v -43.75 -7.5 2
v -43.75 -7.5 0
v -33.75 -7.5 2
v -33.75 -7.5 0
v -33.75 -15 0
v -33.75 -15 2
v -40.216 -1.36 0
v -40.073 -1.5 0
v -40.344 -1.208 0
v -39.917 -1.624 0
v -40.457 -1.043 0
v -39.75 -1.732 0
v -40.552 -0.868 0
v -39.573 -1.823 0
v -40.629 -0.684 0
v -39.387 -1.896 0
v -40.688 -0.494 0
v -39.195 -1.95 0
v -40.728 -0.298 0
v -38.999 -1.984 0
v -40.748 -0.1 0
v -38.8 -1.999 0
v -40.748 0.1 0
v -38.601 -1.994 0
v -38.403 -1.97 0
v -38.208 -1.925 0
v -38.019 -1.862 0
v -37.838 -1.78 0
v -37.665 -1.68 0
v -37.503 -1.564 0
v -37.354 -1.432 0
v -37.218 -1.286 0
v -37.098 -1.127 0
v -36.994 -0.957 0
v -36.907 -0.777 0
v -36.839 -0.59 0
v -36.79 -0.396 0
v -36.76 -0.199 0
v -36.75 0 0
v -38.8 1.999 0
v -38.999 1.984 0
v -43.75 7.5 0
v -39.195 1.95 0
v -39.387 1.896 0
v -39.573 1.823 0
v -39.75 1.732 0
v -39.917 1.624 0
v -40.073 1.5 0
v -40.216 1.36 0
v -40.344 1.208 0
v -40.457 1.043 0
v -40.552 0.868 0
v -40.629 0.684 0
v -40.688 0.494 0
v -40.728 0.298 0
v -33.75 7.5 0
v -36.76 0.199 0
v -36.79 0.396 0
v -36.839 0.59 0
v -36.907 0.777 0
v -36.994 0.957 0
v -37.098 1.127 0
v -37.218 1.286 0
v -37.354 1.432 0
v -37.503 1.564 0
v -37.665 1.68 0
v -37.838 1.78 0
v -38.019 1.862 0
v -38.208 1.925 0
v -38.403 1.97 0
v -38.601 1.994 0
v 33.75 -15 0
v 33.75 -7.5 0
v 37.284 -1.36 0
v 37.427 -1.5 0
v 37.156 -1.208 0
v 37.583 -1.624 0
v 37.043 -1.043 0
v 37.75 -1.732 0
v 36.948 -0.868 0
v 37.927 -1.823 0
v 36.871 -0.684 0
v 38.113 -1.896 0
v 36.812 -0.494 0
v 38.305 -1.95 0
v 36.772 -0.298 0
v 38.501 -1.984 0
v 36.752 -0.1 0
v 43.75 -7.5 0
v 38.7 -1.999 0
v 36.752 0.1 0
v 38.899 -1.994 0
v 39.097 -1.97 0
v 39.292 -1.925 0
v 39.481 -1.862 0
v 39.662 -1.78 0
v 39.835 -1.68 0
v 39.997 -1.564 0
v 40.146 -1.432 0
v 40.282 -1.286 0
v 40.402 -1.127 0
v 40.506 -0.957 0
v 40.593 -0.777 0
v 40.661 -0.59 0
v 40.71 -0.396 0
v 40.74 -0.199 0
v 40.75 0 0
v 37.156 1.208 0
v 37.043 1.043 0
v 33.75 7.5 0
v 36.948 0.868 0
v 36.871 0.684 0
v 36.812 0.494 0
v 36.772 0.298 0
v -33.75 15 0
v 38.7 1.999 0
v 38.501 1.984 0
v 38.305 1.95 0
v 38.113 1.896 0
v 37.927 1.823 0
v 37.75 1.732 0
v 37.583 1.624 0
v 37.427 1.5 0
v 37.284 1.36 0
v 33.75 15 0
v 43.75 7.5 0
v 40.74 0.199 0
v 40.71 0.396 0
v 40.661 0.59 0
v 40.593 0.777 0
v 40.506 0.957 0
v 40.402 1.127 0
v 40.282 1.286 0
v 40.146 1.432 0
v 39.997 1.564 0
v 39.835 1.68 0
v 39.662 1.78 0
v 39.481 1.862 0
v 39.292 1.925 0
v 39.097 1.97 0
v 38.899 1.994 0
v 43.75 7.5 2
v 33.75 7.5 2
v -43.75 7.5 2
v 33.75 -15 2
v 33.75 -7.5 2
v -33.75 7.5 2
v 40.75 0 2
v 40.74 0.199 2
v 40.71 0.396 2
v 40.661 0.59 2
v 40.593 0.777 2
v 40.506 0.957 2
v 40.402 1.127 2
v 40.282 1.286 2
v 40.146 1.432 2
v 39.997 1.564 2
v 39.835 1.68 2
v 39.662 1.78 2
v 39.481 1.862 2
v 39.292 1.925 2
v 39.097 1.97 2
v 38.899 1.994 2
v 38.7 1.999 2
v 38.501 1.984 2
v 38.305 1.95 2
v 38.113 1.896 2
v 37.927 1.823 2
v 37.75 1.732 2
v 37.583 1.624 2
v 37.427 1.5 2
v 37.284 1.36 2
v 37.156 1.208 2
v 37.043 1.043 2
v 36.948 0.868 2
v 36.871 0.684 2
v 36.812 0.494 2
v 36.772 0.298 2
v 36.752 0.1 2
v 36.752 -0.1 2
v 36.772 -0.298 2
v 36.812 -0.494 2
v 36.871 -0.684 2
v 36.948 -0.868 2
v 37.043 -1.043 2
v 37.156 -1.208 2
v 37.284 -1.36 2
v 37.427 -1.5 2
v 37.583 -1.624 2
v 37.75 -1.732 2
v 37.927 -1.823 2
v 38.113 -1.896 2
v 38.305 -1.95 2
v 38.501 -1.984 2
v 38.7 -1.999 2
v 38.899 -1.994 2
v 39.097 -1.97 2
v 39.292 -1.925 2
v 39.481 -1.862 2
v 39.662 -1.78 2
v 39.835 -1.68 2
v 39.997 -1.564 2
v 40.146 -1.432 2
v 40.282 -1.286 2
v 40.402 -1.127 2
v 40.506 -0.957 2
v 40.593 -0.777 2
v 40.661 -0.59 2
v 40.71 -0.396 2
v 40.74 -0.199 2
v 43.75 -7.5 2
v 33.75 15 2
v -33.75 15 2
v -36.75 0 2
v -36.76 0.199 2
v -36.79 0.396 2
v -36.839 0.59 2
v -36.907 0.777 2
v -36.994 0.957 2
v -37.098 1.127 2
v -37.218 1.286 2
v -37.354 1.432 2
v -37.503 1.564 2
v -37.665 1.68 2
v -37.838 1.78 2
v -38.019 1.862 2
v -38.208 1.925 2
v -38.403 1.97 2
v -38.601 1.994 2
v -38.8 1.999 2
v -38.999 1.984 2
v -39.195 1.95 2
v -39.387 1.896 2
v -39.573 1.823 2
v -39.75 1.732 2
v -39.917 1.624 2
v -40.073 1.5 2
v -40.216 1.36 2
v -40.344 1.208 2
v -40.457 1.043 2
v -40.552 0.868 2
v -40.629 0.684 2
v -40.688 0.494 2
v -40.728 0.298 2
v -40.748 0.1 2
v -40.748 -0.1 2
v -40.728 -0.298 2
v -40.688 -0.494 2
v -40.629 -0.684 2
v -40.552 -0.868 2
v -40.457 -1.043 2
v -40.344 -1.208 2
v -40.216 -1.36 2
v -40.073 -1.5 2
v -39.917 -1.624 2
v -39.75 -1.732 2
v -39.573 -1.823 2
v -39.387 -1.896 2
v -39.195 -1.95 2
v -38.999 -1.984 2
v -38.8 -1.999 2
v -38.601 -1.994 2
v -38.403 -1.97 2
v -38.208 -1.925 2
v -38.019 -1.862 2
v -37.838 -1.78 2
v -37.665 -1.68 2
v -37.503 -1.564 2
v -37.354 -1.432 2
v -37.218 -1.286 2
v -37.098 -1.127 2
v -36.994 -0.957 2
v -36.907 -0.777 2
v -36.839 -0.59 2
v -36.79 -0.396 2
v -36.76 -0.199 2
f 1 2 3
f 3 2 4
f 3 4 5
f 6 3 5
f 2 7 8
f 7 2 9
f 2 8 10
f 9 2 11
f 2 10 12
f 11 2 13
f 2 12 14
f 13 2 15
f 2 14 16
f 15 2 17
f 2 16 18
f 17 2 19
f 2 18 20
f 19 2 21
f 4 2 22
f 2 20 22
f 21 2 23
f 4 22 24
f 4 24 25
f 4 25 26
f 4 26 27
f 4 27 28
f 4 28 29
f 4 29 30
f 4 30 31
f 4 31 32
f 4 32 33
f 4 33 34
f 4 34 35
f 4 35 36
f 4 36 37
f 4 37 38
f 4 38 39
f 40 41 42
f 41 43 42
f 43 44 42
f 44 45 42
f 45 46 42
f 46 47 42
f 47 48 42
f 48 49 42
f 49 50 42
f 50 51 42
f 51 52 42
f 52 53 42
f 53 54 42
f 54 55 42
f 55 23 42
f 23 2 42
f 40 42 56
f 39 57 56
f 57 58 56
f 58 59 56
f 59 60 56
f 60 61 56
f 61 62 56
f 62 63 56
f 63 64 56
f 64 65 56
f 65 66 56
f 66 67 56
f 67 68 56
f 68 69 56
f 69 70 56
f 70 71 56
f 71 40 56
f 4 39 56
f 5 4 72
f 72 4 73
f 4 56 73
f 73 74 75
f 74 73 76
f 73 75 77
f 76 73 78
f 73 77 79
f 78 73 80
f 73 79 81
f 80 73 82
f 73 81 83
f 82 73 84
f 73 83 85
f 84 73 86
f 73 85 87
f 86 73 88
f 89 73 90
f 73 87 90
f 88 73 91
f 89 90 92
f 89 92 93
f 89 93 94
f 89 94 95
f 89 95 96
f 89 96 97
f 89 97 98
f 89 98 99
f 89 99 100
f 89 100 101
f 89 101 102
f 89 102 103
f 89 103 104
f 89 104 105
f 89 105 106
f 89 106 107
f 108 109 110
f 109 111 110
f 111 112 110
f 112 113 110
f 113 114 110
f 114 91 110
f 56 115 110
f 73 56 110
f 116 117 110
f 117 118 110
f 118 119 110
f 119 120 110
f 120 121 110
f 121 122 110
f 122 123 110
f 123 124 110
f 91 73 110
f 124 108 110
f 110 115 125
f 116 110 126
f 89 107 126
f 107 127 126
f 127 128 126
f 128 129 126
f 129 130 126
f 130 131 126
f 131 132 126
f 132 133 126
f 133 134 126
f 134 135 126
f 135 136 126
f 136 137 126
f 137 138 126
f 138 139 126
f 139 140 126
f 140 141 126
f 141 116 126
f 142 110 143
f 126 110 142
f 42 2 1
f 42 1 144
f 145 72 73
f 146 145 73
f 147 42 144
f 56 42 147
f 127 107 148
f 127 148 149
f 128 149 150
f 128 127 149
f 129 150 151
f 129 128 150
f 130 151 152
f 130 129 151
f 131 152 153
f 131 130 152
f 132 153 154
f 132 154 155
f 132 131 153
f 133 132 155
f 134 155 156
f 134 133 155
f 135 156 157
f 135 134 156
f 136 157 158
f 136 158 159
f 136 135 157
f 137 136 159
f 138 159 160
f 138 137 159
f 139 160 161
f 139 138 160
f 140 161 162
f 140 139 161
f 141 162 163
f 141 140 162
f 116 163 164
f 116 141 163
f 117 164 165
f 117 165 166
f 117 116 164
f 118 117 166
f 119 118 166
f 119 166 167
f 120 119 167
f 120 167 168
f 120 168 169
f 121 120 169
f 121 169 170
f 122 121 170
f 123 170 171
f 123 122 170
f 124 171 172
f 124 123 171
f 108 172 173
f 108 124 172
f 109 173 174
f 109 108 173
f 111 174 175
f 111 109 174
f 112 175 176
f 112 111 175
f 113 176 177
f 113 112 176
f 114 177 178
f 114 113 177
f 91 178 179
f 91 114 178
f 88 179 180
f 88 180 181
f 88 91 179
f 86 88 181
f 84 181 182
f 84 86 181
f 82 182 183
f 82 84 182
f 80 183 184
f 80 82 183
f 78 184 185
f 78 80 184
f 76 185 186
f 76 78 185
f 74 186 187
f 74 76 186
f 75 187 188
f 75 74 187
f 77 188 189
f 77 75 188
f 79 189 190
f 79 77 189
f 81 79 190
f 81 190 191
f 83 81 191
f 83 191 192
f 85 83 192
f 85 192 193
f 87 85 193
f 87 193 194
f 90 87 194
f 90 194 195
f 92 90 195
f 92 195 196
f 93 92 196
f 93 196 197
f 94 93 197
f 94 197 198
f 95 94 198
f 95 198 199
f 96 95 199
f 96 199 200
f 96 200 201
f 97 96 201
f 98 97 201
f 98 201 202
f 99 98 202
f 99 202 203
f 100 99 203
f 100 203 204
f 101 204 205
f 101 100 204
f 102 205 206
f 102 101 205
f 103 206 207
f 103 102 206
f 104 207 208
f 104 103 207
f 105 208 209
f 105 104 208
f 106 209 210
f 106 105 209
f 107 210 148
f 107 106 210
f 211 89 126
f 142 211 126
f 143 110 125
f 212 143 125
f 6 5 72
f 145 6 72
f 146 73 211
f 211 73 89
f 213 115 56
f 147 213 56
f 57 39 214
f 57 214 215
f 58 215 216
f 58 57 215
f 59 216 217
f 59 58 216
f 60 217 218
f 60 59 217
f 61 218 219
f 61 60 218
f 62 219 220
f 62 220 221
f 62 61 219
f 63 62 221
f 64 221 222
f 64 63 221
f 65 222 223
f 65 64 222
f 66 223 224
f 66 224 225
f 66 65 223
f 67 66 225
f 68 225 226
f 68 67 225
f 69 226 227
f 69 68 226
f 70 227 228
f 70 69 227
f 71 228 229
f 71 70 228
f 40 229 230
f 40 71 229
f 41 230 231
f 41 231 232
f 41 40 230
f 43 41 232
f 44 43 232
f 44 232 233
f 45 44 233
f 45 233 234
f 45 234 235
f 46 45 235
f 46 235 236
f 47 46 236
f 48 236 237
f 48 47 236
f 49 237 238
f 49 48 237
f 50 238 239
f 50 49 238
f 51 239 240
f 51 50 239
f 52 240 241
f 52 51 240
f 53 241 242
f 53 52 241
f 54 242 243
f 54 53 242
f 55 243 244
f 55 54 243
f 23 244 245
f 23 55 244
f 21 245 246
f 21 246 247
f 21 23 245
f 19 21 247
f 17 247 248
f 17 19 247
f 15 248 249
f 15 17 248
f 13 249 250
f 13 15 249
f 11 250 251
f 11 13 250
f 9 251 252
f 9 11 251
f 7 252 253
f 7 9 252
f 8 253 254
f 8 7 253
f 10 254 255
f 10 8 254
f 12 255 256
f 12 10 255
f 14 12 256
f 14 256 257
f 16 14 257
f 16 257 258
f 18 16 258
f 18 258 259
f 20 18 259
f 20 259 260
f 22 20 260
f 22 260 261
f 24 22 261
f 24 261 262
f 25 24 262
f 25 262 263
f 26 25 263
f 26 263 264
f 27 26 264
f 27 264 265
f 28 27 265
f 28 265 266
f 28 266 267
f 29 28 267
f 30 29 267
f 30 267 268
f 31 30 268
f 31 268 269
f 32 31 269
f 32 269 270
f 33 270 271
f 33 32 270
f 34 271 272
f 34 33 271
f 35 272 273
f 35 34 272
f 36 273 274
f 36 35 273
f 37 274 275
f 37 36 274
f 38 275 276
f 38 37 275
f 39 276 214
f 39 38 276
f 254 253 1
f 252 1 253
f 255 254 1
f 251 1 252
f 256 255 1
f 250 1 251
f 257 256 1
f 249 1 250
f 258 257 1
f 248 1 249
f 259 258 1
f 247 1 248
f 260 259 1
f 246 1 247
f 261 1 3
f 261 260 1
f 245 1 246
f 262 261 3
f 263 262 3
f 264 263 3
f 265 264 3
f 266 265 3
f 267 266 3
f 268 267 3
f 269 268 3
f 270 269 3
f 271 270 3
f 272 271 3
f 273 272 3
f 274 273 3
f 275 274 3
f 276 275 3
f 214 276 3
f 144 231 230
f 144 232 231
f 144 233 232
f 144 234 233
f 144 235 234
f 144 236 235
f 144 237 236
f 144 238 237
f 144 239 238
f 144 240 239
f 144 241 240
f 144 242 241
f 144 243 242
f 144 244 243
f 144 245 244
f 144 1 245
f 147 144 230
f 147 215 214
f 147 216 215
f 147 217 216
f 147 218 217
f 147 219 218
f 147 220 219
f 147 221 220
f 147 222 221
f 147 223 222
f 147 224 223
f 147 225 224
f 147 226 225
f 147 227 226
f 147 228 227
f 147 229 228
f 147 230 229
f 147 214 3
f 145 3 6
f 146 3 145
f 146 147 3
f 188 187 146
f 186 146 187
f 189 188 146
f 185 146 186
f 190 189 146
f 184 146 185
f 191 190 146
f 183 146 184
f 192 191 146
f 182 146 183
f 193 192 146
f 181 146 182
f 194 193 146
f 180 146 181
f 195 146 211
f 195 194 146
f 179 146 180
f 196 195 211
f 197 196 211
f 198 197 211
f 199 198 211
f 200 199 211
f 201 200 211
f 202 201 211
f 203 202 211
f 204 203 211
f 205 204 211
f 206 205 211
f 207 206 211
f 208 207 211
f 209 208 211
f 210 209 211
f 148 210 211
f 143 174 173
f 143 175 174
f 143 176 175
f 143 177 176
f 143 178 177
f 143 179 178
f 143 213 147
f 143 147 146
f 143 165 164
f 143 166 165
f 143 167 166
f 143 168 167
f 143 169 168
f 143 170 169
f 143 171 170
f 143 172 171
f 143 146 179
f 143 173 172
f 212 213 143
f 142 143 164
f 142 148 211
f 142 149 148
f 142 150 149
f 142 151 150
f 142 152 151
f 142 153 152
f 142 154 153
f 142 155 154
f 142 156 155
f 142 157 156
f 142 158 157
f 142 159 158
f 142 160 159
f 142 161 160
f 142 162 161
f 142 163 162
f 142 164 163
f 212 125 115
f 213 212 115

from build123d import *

# Parameters (mm, degrees)
F0_W     = 10
F0_H     = 15
F0_R     = 2
F1_DEPTH = 2


with BuildPart() as f1:
    # F0 (on Top) → F1 (new body)
    with BuildSketch(Plane.XY):
        Polygon((-33.75, -15), (33.75, -15), (33.75, -7.5), (33.75, 7.5), (33.75, 15), (-33.75, 15), (-33.75, 7.5), (-33.75, -7.5), align=None)
        with Locations((-38.75, 0)):
            Rectangle(F0_W, F0_H)
        with Locations((-38.75, 0)):
            Circle(F0_R, mode=Mode.SUBTRACT)
        with Locations((38.75, 0)):
            Rectangle(F0_W, F0_H)
        with Locations((38.75, 0)):
            Circle(F0_R, mode=Mode.SUBTRACT)
    extrude(amount=F1_DEPTH)


solid = f1.part
